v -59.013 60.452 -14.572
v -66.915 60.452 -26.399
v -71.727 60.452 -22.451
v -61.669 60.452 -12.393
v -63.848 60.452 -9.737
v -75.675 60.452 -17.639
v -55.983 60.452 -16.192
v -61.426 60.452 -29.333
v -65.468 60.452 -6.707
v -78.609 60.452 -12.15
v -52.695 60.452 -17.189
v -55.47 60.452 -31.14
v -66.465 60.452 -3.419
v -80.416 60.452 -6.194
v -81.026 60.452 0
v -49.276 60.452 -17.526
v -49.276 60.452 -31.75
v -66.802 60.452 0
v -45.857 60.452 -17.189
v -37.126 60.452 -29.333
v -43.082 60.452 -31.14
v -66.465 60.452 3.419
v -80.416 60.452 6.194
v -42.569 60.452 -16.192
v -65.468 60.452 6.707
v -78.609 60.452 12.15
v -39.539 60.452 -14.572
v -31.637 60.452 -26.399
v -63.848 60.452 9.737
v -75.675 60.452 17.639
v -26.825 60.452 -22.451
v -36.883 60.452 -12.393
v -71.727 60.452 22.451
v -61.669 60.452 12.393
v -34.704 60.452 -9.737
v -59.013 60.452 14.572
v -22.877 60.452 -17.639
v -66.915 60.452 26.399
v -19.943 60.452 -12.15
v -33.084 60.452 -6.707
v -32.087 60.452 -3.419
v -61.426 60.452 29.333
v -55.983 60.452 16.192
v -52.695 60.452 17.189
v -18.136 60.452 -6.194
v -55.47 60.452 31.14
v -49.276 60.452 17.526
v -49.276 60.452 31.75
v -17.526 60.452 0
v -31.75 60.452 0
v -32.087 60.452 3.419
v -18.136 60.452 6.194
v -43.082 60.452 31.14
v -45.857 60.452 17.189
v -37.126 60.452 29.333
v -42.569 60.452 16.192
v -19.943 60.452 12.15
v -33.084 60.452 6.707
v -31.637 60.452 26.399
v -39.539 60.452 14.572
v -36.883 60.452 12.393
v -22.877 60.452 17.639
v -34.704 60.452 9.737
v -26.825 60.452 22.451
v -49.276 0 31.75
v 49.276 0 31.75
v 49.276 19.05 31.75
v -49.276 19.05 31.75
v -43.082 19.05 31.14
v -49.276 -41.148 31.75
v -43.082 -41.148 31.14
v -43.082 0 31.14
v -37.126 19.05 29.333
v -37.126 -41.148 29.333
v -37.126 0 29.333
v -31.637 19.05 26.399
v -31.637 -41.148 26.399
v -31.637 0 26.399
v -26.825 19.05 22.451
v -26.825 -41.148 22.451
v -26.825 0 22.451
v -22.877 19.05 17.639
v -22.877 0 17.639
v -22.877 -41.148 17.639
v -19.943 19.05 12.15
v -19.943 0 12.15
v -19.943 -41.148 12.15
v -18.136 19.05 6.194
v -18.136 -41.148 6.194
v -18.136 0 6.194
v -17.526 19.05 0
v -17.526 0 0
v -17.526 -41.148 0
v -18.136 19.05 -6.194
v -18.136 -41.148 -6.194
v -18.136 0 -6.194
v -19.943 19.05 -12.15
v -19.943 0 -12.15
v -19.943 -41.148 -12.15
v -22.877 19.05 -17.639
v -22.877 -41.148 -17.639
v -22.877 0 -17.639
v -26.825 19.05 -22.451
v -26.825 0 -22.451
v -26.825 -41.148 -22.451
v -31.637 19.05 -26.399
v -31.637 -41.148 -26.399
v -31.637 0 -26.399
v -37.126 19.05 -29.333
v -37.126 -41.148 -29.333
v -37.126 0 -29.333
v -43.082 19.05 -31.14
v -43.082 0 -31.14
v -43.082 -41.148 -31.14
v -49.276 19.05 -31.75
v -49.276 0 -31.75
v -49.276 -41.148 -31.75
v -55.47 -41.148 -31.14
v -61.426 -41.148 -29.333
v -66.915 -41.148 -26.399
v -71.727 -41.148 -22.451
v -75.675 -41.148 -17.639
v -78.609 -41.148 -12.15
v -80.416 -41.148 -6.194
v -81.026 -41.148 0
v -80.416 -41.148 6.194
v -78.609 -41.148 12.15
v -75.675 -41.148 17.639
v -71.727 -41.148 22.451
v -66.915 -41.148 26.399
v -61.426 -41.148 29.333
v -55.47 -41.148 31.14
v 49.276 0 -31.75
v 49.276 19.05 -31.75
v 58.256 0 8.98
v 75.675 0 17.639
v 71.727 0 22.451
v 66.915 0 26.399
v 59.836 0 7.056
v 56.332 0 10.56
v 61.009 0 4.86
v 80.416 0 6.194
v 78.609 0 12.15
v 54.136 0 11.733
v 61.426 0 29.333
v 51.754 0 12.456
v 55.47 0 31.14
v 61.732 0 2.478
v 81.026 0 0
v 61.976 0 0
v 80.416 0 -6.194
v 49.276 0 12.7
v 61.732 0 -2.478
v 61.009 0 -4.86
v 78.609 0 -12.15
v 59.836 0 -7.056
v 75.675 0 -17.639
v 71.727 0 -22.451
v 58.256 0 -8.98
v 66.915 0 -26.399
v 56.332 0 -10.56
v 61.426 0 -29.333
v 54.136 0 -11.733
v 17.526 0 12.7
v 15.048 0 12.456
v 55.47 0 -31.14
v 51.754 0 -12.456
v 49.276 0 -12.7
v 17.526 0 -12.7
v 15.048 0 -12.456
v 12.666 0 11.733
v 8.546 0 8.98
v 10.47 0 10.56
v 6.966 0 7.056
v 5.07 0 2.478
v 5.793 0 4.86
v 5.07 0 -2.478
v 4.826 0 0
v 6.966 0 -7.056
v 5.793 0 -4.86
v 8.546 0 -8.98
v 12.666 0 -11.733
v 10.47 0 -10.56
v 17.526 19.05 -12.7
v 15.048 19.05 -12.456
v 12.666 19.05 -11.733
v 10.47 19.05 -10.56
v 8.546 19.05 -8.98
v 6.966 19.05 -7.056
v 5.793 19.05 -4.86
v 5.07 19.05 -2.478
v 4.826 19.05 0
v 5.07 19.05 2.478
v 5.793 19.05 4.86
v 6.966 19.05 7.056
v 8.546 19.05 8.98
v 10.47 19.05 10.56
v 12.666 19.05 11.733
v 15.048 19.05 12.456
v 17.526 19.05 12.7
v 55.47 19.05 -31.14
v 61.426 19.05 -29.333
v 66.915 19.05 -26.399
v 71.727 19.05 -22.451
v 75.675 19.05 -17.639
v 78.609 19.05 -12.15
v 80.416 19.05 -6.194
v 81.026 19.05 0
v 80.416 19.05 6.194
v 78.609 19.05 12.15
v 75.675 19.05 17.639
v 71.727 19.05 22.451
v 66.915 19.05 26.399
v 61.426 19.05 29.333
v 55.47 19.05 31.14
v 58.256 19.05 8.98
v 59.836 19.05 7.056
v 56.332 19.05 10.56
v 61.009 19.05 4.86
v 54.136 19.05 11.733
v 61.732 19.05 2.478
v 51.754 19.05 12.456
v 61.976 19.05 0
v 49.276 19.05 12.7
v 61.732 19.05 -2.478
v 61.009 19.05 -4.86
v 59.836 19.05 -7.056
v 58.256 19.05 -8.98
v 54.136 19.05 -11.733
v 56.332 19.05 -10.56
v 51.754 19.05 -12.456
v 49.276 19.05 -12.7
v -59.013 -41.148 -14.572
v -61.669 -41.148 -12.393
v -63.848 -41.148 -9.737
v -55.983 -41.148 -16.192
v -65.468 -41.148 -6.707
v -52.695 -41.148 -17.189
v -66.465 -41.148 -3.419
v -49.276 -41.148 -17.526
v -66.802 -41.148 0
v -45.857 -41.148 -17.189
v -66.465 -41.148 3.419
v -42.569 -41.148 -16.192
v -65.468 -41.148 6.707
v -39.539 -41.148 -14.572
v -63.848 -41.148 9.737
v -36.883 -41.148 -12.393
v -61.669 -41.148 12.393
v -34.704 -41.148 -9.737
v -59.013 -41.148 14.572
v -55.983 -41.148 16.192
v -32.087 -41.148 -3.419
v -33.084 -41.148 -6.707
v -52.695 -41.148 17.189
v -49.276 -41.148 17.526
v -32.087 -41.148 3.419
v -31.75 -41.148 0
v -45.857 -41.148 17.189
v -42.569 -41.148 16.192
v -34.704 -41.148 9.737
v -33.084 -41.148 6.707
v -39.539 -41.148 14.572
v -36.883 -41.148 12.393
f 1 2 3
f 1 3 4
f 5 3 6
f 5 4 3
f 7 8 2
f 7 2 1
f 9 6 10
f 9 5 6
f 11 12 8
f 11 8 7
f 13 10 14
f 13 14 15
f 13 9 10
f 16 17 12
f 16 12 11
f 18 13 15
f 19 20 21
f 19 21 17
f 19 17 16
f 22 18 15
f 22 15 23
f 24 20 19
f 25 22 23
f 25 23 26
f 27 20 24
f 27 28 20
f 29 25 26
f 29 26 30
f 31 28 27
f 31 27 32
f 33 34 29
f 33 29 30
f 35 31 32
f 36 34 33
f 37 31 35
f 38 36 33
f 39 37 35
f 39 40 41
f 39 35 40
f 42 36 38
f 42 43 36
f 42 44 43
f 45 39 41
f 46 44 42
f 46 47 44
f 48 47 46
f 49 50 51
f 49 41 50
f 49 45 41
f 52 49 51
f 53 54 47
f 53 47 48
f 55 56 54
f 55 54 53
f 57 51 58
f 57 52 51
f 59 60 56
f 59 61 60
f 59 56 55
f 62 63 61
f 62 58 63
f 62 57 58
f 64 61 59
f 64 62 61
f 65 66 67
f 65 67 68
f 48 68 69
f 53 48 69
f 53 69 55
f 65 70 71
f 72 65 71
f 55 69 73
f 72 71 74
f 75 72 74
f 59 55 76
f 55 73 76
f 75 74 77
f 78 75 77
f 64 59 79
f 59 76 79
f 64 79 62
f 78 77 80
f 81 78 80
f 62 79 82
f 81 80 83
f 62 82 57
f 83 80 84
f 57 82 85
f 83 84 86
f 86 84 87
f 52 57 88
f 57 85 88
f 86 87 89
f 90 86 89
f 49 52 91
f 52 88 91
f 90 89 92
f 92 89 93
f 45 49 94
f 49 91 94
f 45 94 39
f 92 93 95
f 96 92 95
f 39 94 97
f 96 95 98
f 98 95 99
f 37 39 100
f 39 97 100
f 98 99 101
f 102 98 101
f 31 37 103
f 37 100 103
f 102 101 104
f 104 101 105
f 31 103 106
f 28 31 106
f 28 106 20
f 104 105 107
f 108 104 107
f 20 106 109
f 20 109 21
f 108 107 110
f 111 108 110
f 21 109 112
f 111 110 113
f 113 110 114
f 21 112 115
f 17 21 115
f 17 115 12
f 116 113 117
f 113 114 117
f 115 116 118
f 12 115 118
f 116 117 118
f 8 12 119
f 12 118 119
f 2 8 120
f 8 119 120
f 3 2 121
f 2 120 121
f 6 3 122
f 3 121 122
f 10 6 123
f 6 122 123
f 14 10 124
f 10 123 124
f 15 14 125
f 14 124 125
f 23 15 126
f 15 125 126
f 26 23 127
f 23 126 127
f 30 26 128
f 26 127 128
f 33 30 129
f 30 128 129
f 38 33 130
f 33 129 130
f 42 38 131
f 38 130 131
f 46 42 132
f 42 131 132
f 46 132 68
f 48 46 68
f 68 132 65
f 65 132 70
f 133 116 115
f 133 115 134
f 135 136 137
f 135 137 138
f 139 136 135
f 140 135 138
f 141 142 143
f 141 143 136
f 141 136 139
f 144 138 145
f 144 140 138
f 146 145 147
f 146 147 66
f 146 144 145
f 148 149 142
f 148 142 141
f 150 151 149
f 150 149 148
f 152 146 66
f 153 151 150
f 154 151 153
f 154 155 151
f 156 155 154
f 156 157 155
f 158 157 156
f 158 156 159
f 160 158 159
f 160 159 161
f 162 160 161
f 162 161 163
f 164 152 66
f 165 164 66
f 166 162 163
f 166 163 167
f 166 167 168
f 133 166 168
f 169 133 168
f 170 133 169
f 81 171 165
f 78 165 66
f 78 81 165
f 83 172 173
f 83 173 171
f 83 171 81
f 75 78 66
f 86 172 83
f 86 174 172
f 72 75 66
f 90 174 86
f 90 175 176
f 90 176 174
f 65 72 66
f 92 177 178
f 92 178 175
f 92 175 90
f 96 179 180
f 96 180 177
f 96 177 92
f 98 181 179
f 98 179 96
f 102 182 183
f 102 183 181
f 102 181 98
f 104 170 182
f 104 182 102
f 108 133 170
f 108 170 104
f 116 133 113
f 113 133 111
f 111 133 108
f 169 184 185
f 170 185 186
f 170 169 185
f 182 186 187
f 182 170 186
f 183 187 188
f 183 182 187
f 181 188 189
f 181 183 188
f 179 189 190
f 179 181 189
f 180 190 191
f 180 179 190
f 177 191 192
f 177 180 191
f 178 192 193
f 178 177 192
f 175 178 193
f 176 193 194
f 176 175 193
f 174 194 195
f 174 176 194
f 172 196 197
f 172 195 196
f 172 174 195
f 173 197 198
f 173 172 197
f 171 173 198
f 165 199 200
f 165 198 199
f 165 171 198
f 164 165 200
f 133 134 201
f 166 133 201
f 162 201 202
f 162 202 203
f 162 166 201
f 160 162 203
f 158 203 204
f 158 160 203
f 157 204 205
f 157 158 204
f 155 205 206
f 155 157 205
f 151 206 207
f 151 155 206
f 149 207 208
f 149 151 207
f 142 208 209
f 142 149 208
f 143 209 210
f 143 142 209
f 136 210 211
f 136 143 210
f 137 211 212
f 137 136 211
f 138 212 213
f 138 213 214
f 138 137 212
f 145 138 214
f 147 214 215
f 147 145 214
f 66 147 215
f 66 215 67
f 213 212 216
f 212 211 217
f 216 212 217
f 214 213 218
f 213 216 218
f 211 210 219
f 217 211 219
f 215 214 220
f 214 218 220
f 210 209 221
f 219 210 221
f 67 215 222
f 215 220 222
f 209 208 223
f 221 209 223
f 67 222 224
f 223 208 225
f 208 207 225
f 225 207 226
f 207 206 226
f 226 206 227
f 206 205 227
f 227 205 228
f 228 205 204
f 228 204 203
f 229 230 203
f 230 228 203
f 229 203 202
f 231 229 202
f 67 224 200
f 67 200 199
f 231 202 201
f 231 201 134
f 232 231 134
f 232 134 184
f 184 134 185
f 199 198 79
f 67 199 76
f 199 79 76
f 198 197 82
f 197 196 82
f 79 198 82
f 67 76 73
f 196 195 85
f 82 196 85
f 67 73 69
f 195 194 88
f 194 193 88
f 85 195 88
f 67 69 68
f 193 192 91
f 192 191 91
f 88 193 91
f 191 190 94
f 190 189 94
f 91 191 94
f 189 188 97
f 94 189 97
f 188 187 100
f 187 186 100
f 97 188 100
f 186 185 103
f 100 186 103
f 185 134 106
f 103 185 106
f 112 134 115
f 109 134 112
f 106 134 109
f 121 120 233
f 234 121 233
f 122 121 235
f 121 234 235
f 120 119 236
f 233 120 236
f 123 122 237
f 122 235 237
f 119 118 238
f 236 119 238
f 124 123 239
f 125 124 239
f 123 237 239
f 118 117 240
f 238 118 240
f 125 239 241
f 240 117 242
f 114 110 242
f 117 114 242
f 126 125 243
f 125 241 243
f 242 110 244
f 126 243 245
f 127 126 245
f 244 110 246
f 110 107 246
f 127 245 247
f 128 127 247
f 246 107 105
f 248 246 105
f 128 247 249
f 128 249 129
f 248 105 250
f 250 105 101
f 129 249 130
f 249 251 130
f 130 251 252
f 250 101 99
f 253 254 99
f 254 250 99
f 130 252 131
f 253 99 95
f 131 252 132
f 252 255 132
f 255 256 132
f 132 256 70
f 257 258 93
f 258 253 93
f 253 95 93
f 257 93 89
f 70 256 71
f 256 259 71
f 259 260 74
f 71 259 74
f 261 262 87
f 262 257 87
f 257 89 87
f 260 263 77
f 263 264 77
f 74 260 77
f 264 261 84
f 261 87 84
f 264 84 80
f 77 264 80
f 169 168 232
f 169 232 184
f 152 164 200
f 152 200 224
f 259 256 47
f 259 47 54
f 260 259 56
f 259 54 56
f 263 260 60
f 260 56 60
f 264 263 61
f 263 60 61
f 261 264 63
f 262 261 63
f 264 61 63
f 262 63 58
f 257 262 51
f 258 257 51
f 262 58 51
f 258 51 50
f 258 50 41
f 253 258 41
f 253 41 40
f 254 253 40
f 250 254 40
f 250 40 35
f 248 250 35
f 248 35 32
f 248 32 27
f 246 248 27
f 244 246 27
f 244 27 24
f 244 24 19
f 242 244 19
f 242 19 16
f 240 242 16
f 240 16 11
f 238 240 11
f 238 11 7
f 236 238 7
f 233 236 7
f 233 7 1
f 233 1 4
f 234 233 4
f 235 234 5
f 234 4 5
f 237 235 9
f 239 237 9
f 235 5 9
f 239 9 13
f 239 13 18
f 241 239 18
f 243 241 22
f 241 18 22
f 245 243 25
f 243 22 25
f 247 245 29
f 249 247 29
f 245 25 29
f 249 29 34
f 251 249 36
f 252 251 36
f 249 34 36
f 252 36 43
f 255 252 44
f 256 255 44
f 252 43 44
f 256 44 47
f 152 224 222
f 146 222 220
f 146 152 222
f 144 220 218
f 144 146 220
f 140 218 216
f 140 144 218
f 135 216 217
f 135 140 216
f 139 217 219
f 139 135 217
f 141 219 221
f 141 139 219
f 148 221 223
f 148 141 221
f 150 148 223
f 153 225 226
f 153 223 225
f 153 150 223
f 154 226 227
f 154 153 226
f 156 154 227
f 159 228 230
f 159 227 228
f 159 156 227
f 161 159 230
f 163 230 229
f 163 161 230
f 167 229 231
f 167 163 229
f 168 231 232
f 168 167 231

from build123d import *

# Parameters (mm, degrees)
BOSS_EXTRUDE1_DEPTH      = 19.05
CUT_EXTRUDE3_DEPTH       = 20.05
SKETCH3_R                = 31.75
BOSS_EXTRUDE2_DEPTH      = 41.402
BOSS_EXTRUDE2_DEPTH_BACK = 60.198
SKETCH4_R                = 17.526
CUT_EXTRUDE2_DEPTH       = 102.6


with BuildPart() as part:
    # Sketch1 → Boss-Extrude1 (new body)
    with BuildSketch(Plane(origin=(0, 0, 0), x_dir=(1, 0, 0), z_dir=(0, 1, 0))):
        with BuildLine():
            Line((-49.276, 31.75), (49.276, 31.75))
            ThreePointArc((49.276, 31.75), (81.026, 0), (49.276, -31.75))
            Line((49.276, -31.75), (-49.276, -31.75))
            ThreePointArc((-49.276, -31.75), (-81.026, 0), (-49.276, 31.75))
        make_face()
    extrude(amount=BOSS_EXTRUDE1_DEPTH)

    # Sketch5 → Cut-Extrude3 (cut, through all)
    with BuildSketch(Plane.XZ):
        with BuildLine():
            Line((17.526, 12.7), (49.276, 12.7))
            ThreePointArc((49.276, 12.7), (61.976, 0), (49.276, -12.7))
            Line((49.276, -12.7), (17.526, -12.7))
            ThreePointArc((17.526, -12.7), (4.826, 0), (17.526, 12.7))
        make_face()
    extrude(amount=-CUT_EXTRUDE3_DEPTH, mode=Mode.SUBTRACT)

    # Sketch3 → Boss-Extrude2 (add, two sides)
    with BuildSketch(Plane(origin=(0, 19.05, 0), x_dir=(1, 0, 0), z_dir=(0, 1, 0))) as boss_extrude2_sk:
        with Locations(Location((-49.276, 0, 0), (0, 0, 270))):  # turned: the seam where the file's is
            Circle(SKETCH3_R)
    extrude(amount=BOSS_EXTRUDE2_DEPTH)
    extrude(boss_extrude2_sk.sketch, amount=-BOSS_EXTRUDE2_DEPTH_BACK)

    # Sketch4 → Cut-Extrude2 (cut, through all)
    with BuildSketch(Plane(origin=(0, 60.452, 0), x_dir=(1, 0, 0), z_dir=(0, 1, 0))):
        with Locations(Location((-49.276, 0, 0), (0, 0, 270))):  # turned: the seam where the file's is
            Circle(SKETCH4_R)
    extrude(amount=-CUT_EXTRUDE2_DEPTH, mode=Mode.SUBTRACT)


solid = part.part
